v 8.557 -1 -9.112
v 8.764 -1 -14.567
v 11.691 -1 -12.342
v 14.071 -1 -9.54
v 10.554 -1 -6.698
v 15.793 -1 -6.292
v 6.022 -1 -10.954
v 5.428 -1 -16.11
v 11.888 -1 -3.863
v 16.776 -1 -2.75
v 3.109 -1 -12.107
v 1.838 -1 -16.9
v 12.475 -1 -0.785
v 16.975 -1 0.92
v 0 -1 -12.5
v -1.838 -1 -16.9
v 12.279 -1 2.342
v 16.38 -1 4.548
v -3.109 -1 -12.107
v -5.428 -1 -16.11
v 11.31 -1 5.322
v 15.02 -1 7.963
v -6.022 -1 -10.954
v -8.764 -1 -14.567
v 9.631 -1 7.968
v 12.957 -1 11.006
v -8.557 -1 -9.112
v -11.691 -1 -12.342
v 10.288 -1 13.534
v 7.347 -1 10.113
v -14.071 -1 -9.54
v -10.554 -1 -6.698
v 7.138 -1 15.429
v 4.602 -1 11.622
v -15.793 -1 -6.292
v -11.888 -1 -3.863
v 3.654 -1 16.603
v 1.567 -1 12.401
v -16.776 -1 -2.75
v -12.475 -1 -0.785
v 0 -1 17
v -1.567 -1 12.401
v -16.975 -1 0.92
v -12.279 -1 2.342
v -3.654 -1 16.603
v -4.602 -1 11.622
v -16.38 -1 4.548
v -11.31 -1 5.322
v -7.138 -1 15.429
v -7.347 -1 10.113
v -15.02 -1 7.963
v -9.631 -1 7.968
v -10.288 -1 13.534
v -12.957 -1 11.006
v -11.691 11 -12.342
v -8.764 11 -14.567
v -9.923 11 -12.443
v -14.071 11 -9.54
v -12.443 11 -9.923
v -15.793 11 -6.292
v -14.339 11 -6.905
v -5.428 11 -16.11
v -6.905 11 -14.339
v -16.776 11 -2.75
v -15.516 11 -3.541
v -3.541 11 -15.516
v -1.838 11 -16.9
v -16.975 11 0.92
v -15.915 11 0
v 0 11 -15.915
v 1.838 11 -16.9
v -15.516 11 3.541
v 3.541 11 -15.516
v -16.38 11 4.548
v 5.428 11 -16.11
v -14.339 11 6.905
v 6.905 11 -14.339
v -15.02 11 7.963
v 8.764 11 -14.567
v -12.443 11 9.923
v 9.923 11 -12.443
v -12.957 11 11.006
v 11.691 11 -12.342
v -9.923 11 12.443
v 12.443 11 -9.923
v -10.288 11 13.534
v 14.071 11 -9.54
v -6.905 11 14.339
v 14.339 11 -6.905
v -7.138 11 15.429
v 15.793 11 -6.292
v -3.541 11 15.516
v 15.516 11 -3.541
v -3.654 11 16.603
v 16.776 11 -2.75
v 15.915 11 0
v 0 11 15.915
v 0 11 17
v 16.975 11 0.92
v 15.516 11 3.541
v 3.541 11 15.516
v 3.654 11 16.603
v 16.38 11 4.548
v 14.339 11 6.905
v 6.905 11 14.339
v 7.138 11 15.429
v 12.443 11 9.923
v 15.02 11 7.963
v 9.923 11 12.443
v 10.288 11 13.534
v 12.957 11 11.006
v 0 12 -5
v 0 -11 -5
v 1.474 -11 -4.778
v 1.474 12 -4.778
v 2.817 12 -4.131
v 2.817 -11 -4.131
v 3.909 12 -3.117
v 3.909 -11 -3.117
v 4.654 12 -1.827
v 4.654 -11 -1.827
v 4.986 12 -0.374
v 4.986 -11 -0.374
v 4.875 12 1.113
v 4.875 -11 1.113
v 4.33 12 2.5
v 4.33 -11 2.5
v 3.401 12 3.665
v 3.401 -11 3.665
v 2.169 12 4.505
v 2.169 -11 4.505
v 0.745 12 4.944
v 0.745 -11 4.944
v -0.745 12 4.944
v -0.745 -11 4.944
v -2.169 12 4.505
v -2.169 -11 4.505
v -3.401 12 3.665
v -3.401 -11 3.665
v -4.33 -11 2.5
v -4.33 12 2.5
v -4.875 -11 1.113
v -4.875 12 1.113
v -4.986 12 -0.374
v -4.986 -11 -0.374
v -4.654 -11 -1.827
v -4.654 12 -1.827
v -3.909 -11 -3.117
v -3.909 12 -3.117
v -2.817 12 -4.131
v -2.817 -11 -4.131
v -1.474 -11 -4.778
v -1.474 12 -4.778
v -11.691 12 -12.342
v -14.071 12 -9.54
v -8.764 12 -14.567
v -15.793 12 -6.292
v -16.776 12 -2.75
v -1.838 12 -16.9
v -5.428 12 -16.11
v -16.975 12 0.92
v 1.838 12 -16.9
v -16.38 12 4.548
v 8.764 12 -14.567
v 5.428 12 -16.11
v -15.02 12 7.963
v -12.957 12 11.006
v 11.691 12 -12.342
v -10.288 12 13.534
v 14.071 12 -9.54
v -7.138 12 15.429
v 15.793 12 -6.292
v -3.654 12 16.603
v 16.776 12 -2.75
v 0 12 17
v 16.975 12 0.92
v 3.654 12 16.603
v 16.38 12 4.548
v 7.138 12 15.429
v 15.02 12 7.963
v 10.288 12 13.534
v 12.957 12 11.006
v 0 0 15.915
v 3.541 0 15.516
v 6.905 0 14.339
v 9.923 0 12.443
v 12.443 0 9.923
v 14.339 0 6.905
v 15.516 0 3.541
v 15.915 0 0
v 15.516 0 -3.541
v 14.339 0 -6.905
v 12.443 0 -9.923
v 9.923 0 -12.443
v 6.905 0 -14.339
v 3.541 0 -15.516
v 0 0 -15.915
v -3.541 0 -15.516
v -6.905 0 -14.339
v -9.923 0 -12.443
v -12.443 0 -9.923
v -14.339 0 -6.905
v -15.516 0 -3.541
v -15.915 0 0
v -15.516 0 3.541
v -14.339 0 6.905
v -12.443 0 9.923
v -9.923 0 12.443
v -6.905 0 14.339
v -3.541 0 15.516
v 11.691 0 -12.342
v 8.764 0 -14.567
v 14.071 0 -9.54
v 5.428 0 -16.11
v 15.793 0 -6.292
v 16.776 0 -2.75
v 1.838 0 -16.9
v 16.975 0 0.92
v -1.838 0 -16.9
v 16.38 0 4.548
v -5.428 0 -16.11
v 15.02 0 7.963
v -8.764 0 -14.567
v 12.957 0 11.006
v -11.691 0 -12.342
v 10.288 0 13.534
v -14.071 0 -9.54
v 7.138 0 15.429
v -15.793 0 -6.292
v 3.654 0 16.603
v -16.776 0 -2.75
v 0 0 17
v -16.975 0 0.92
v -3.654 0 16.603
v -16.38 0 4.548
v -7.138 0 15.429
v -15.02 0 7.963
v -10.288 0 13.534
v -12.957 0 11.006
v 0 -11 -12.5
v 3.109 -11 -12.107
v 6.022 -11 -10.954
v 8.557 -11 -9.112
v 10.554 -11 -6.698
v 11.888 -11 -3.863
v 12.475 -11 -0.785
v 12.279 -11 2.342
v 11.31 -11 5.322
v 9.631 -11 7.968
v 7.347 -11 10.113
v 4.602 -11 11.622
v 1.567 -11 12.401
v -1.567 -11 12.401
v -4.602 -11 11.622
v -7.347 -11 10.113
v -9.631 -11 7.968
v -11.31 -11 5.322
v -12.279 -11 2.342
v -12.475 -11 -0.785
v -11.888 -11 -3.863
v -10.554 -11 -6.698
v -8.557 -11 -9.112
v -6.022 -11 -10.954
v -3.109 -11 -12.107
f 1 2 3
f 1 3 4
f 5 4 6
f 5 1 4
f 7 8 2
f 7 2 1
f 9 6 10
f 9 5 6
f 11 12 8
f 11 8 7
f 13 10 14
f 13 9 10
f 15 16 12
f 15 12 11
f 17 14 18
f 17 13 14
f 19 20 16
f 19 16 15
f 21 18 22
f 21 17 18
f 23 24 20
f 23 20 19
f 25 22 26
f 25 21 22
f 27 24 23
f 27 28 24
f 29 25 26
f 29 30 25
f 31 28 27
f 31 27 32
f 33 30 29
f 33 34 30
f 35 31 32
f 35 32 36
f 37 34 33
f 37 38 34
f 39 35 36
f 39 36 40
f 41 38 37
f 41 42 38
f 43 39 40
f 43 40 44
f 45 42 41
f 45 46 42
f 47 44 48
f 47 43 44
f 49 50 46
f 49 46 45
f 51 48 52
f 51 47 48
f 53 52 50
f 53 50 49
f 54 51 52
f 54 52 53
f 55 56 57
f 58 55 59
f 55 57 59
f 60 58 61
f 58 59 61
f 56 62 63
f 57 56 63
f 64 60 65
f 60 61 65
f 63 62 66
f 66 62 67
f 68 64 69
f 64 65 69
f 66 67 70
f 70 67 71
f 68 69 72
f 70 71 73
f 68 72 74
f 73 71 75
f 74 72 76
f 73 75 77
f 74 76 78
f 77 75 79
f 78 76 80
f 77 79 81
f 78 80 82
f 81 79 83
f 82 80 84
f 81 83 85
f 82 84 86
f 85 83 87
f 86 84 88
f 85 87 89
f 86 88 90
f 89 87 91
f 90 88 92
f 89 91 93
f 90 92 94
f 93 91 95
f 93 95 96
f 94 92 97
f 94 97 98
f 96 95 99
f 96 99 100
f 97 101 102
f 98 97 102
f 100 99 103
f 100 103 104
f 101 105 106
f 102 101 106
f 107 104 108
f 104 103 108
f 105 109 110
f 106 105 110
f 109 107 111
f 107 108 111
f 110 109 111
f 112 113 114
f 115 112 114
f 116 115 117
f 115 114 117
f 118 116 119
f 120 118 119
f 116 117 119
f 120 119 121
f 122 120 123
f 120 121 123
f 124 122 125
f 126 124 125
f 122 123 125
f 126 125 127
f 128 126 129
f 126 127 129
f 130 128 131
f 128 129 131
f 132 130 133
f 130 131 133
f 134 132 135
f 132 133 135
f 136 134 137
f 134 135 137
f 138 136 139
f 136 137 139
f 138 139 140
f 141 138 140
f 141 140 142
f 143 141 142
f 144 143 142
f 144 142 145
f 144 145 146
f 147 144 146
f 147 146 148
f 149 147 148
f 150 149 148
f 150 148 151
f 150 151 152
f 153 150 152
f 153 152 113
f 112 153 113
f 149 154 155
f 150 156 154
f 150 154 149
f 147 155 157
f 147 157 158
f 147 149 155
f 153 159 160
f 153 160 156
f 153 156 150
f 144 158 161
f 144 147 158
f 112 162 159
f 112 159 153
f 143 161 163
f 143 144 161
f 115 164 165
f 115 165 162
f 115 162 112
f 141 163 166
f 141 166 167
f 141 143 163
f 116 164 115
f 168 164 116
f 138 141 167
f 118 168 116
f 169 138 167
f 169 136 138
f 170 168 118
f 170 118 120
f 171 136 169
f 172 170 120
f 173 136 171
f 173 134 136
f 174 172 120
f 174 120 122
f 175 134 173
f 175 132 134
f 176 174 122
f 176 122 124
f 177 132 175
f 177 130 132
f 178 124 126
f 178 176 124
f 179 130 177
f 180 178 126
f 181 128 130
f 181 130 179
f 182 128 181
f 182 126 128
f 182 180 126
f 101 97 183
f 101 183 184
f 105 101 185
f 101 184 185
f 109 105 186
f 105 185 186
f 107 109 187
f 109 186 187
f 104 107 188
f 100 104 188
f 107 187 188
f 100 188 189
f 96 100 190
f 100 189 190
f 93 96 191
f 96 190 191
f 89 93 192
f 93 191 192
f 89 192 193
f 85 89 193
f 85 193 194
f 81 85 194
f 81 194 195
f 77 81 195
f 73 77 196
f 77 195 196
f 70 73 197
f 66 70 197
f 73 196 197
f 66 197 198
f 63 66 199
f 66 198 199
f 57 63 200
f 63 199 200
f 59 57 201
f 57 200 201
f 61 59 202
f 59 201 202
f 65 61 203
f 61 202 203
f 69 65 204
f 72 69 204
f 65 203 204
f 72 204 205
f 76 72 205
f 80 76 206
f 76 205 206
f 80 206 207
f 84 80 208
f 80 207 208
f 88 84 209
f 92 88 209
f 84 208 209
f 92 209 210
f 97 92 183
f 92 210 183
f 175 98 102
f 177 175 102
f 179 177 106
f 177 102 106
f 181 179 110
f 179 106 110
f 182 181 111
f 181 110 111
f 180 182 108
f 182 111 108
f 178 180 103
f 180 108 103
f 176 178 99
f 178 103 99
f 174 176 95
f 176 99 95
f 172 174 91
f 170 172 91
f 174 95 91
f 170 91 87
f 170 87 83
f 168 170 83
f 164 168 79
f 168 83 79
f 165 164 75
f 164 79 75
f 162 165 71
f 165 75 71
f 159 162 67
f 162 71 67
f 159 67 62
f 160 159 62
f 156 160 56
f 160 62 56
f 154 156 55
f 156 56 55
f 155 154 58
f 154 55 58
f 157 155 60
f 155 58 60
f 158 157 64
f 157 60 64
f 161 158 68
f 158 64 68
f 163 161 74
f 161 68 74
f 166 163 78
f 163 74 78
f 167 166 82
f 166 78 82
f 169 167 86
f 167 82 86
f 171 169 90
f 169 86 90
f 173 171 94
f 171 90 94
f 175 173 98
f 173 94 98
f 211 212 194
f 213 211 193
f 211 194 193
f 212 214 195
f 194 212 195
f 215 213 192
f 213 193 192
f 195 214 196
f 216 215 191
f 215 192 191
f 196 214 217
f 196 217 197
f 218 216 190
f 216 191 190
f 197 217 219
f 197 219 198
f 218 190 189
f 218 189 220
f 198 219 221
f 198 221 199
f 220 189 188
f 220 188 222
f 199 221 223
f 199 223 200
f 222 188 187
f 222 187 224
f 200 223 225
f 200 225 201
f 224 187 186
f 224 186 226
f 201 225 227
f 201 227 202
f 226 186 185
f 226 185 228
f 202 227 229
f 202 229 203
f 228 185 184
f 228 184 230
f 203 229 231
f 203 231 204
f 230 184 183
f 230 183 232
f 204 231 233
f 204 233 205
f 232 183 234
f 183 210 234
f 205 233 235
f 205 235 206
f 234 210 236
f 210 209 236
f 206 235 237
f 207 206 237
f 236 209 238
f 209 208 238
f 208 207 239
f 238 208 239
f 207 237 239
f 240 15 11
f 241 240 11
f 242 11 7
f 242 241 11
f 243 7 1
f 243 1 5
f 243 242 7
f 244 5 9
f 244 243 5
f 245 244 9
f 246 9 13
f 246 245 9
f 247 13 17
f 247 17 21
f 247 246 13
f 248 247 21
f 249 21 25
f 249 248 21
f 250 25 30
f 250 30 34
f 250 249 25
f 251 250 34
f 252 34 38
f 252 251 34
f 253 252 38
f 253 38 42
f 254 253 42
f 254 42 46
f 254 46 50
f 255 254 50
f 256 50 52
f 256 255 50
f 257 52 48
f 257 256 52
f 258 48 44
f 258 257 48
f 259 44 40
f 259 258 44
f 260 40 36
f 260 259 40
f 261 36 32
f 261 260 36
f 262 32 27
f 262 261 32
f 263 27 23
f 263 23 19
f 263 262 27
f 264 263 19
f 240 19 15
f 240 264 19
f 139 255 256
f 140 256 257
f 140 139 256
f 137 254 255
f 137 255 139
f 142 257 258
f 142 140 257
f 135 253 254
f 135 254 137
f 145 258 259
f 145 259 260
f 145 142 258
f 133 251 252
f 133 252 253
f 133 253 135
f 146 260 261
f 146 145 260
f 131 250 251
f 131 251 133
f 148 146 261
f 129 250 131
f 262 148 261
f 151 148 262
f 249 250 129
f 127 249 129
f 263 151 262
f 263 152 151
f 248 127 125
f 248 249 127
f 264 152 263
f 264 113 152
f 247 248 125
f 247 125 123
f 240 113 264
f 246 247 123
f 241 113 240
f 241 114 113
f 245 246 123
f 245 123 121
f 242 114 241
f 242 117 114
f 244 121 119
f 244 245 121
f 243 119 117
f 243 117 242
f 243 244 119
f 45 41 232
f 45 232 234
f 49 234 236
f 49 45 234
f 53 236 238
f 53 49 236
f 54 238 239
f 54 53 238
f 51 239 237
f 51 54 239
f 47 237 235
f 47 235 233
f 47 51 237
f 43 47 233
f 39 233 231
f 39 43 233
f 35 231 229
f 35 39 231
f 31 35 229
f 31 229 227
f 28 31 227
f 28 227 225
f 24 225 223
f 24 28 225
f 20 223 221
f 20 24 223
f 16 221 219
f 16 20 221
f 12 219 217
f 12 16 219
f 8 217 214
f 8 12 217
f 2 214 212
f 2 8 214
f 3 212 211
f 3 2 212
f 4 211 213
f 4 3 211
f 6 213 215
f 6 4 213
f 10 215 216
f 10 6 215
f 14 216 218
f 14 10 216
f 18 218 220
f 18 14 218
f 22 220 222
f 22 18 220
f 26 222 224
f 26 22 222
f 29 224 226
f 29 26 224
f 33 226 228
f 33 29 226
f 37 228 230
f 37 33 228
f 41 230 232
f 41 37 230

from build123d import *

# Parameters (mm, degrees)
SKETCH_1_R          = 15.915
EXTRUDE_1_DEPTH     = 11
SKETCH_2_R          = 17
EXTRUDE_2_DEPTH     = 1
EXTRUDE_START       = 1
SKETCH_3_R          = 17
EXTRUDE_3_DEPTH     = 1
SKETCH_4_R          = 5
CUT_EXTRUDE_1_DEPTH = 28.331300737
EXTRUDE_START_2     = 10
SKETCH_5_R          = 12.5
SKETCH_5_R_2        = 5
EXTRUDE_4_DEPTH     = 10


with BuildPart() as part:
    # 草图1 → 凸台-拉伸1 (new body)
    with BuildSketch(Plane(origin=(0, 0, 0), x_dir=(1, 0, 0), z_dir=(0, 1, 0))):
        with Locations(Location((0, 0, 0), (0, 0, 270))):
            Circle(SKETCH_1_R)
    extrude(amount=EXTRUDE_1_DEPTH)

    # 草图2 → 凸台-拉伸2 (add)
    with BuildSketch(Plane(origin=(0, 11, 0), x_dir=(1, 0, 0), z_dir=(0, 1, 0))):
        with Locations(Location((0, 0, 0), (0, 0, 270))):
            Circle(SKETCH_2_R)
    extrude(amount=EXTRUDE_2_DEPTH)

    # 草图3 → 凸台-拉伸3 (add)
    with BuildSketch(Plane.XZ.offset(EXTRUDE_START)):
        with Locations(Location((0, 0, 0), (0, 0, 90))):
            Circle(SKETCH_3_R)
    extrude(amount=-EXTRUDE_3_DEPTH)

    # 草图4 → 切除-拉伸1 (cut, through all)
    with BuildSketch(Plane.XZ.offset(1)):
        with Locations(Location((0, 0, 0), (0, 0, 270))):
            Circle(SKETCH_4_R)
    extrude(amount=-CUT_EXTRUDE_1_DEPTH, mode=Mode.SUBTRACT)

    # 草图5 → 凸台-拉伸4 (add)
    with BuildSketch(Plane.XZ.offset(1).offset(EXTRUDE_START_2)):
        with Locations(Location((0, 0, 0), (0, 0, 270))):
            Circle(SKETCH_5_R)
        with Locations(Location((0, 0, 0), (0, 0, 270))):
            Circle(SKETCH_5_R_2, mode=Mode.SUBTRACT)
    extrude(amount=-EXTRUDE_4_DEPTH)


solid = part.part
